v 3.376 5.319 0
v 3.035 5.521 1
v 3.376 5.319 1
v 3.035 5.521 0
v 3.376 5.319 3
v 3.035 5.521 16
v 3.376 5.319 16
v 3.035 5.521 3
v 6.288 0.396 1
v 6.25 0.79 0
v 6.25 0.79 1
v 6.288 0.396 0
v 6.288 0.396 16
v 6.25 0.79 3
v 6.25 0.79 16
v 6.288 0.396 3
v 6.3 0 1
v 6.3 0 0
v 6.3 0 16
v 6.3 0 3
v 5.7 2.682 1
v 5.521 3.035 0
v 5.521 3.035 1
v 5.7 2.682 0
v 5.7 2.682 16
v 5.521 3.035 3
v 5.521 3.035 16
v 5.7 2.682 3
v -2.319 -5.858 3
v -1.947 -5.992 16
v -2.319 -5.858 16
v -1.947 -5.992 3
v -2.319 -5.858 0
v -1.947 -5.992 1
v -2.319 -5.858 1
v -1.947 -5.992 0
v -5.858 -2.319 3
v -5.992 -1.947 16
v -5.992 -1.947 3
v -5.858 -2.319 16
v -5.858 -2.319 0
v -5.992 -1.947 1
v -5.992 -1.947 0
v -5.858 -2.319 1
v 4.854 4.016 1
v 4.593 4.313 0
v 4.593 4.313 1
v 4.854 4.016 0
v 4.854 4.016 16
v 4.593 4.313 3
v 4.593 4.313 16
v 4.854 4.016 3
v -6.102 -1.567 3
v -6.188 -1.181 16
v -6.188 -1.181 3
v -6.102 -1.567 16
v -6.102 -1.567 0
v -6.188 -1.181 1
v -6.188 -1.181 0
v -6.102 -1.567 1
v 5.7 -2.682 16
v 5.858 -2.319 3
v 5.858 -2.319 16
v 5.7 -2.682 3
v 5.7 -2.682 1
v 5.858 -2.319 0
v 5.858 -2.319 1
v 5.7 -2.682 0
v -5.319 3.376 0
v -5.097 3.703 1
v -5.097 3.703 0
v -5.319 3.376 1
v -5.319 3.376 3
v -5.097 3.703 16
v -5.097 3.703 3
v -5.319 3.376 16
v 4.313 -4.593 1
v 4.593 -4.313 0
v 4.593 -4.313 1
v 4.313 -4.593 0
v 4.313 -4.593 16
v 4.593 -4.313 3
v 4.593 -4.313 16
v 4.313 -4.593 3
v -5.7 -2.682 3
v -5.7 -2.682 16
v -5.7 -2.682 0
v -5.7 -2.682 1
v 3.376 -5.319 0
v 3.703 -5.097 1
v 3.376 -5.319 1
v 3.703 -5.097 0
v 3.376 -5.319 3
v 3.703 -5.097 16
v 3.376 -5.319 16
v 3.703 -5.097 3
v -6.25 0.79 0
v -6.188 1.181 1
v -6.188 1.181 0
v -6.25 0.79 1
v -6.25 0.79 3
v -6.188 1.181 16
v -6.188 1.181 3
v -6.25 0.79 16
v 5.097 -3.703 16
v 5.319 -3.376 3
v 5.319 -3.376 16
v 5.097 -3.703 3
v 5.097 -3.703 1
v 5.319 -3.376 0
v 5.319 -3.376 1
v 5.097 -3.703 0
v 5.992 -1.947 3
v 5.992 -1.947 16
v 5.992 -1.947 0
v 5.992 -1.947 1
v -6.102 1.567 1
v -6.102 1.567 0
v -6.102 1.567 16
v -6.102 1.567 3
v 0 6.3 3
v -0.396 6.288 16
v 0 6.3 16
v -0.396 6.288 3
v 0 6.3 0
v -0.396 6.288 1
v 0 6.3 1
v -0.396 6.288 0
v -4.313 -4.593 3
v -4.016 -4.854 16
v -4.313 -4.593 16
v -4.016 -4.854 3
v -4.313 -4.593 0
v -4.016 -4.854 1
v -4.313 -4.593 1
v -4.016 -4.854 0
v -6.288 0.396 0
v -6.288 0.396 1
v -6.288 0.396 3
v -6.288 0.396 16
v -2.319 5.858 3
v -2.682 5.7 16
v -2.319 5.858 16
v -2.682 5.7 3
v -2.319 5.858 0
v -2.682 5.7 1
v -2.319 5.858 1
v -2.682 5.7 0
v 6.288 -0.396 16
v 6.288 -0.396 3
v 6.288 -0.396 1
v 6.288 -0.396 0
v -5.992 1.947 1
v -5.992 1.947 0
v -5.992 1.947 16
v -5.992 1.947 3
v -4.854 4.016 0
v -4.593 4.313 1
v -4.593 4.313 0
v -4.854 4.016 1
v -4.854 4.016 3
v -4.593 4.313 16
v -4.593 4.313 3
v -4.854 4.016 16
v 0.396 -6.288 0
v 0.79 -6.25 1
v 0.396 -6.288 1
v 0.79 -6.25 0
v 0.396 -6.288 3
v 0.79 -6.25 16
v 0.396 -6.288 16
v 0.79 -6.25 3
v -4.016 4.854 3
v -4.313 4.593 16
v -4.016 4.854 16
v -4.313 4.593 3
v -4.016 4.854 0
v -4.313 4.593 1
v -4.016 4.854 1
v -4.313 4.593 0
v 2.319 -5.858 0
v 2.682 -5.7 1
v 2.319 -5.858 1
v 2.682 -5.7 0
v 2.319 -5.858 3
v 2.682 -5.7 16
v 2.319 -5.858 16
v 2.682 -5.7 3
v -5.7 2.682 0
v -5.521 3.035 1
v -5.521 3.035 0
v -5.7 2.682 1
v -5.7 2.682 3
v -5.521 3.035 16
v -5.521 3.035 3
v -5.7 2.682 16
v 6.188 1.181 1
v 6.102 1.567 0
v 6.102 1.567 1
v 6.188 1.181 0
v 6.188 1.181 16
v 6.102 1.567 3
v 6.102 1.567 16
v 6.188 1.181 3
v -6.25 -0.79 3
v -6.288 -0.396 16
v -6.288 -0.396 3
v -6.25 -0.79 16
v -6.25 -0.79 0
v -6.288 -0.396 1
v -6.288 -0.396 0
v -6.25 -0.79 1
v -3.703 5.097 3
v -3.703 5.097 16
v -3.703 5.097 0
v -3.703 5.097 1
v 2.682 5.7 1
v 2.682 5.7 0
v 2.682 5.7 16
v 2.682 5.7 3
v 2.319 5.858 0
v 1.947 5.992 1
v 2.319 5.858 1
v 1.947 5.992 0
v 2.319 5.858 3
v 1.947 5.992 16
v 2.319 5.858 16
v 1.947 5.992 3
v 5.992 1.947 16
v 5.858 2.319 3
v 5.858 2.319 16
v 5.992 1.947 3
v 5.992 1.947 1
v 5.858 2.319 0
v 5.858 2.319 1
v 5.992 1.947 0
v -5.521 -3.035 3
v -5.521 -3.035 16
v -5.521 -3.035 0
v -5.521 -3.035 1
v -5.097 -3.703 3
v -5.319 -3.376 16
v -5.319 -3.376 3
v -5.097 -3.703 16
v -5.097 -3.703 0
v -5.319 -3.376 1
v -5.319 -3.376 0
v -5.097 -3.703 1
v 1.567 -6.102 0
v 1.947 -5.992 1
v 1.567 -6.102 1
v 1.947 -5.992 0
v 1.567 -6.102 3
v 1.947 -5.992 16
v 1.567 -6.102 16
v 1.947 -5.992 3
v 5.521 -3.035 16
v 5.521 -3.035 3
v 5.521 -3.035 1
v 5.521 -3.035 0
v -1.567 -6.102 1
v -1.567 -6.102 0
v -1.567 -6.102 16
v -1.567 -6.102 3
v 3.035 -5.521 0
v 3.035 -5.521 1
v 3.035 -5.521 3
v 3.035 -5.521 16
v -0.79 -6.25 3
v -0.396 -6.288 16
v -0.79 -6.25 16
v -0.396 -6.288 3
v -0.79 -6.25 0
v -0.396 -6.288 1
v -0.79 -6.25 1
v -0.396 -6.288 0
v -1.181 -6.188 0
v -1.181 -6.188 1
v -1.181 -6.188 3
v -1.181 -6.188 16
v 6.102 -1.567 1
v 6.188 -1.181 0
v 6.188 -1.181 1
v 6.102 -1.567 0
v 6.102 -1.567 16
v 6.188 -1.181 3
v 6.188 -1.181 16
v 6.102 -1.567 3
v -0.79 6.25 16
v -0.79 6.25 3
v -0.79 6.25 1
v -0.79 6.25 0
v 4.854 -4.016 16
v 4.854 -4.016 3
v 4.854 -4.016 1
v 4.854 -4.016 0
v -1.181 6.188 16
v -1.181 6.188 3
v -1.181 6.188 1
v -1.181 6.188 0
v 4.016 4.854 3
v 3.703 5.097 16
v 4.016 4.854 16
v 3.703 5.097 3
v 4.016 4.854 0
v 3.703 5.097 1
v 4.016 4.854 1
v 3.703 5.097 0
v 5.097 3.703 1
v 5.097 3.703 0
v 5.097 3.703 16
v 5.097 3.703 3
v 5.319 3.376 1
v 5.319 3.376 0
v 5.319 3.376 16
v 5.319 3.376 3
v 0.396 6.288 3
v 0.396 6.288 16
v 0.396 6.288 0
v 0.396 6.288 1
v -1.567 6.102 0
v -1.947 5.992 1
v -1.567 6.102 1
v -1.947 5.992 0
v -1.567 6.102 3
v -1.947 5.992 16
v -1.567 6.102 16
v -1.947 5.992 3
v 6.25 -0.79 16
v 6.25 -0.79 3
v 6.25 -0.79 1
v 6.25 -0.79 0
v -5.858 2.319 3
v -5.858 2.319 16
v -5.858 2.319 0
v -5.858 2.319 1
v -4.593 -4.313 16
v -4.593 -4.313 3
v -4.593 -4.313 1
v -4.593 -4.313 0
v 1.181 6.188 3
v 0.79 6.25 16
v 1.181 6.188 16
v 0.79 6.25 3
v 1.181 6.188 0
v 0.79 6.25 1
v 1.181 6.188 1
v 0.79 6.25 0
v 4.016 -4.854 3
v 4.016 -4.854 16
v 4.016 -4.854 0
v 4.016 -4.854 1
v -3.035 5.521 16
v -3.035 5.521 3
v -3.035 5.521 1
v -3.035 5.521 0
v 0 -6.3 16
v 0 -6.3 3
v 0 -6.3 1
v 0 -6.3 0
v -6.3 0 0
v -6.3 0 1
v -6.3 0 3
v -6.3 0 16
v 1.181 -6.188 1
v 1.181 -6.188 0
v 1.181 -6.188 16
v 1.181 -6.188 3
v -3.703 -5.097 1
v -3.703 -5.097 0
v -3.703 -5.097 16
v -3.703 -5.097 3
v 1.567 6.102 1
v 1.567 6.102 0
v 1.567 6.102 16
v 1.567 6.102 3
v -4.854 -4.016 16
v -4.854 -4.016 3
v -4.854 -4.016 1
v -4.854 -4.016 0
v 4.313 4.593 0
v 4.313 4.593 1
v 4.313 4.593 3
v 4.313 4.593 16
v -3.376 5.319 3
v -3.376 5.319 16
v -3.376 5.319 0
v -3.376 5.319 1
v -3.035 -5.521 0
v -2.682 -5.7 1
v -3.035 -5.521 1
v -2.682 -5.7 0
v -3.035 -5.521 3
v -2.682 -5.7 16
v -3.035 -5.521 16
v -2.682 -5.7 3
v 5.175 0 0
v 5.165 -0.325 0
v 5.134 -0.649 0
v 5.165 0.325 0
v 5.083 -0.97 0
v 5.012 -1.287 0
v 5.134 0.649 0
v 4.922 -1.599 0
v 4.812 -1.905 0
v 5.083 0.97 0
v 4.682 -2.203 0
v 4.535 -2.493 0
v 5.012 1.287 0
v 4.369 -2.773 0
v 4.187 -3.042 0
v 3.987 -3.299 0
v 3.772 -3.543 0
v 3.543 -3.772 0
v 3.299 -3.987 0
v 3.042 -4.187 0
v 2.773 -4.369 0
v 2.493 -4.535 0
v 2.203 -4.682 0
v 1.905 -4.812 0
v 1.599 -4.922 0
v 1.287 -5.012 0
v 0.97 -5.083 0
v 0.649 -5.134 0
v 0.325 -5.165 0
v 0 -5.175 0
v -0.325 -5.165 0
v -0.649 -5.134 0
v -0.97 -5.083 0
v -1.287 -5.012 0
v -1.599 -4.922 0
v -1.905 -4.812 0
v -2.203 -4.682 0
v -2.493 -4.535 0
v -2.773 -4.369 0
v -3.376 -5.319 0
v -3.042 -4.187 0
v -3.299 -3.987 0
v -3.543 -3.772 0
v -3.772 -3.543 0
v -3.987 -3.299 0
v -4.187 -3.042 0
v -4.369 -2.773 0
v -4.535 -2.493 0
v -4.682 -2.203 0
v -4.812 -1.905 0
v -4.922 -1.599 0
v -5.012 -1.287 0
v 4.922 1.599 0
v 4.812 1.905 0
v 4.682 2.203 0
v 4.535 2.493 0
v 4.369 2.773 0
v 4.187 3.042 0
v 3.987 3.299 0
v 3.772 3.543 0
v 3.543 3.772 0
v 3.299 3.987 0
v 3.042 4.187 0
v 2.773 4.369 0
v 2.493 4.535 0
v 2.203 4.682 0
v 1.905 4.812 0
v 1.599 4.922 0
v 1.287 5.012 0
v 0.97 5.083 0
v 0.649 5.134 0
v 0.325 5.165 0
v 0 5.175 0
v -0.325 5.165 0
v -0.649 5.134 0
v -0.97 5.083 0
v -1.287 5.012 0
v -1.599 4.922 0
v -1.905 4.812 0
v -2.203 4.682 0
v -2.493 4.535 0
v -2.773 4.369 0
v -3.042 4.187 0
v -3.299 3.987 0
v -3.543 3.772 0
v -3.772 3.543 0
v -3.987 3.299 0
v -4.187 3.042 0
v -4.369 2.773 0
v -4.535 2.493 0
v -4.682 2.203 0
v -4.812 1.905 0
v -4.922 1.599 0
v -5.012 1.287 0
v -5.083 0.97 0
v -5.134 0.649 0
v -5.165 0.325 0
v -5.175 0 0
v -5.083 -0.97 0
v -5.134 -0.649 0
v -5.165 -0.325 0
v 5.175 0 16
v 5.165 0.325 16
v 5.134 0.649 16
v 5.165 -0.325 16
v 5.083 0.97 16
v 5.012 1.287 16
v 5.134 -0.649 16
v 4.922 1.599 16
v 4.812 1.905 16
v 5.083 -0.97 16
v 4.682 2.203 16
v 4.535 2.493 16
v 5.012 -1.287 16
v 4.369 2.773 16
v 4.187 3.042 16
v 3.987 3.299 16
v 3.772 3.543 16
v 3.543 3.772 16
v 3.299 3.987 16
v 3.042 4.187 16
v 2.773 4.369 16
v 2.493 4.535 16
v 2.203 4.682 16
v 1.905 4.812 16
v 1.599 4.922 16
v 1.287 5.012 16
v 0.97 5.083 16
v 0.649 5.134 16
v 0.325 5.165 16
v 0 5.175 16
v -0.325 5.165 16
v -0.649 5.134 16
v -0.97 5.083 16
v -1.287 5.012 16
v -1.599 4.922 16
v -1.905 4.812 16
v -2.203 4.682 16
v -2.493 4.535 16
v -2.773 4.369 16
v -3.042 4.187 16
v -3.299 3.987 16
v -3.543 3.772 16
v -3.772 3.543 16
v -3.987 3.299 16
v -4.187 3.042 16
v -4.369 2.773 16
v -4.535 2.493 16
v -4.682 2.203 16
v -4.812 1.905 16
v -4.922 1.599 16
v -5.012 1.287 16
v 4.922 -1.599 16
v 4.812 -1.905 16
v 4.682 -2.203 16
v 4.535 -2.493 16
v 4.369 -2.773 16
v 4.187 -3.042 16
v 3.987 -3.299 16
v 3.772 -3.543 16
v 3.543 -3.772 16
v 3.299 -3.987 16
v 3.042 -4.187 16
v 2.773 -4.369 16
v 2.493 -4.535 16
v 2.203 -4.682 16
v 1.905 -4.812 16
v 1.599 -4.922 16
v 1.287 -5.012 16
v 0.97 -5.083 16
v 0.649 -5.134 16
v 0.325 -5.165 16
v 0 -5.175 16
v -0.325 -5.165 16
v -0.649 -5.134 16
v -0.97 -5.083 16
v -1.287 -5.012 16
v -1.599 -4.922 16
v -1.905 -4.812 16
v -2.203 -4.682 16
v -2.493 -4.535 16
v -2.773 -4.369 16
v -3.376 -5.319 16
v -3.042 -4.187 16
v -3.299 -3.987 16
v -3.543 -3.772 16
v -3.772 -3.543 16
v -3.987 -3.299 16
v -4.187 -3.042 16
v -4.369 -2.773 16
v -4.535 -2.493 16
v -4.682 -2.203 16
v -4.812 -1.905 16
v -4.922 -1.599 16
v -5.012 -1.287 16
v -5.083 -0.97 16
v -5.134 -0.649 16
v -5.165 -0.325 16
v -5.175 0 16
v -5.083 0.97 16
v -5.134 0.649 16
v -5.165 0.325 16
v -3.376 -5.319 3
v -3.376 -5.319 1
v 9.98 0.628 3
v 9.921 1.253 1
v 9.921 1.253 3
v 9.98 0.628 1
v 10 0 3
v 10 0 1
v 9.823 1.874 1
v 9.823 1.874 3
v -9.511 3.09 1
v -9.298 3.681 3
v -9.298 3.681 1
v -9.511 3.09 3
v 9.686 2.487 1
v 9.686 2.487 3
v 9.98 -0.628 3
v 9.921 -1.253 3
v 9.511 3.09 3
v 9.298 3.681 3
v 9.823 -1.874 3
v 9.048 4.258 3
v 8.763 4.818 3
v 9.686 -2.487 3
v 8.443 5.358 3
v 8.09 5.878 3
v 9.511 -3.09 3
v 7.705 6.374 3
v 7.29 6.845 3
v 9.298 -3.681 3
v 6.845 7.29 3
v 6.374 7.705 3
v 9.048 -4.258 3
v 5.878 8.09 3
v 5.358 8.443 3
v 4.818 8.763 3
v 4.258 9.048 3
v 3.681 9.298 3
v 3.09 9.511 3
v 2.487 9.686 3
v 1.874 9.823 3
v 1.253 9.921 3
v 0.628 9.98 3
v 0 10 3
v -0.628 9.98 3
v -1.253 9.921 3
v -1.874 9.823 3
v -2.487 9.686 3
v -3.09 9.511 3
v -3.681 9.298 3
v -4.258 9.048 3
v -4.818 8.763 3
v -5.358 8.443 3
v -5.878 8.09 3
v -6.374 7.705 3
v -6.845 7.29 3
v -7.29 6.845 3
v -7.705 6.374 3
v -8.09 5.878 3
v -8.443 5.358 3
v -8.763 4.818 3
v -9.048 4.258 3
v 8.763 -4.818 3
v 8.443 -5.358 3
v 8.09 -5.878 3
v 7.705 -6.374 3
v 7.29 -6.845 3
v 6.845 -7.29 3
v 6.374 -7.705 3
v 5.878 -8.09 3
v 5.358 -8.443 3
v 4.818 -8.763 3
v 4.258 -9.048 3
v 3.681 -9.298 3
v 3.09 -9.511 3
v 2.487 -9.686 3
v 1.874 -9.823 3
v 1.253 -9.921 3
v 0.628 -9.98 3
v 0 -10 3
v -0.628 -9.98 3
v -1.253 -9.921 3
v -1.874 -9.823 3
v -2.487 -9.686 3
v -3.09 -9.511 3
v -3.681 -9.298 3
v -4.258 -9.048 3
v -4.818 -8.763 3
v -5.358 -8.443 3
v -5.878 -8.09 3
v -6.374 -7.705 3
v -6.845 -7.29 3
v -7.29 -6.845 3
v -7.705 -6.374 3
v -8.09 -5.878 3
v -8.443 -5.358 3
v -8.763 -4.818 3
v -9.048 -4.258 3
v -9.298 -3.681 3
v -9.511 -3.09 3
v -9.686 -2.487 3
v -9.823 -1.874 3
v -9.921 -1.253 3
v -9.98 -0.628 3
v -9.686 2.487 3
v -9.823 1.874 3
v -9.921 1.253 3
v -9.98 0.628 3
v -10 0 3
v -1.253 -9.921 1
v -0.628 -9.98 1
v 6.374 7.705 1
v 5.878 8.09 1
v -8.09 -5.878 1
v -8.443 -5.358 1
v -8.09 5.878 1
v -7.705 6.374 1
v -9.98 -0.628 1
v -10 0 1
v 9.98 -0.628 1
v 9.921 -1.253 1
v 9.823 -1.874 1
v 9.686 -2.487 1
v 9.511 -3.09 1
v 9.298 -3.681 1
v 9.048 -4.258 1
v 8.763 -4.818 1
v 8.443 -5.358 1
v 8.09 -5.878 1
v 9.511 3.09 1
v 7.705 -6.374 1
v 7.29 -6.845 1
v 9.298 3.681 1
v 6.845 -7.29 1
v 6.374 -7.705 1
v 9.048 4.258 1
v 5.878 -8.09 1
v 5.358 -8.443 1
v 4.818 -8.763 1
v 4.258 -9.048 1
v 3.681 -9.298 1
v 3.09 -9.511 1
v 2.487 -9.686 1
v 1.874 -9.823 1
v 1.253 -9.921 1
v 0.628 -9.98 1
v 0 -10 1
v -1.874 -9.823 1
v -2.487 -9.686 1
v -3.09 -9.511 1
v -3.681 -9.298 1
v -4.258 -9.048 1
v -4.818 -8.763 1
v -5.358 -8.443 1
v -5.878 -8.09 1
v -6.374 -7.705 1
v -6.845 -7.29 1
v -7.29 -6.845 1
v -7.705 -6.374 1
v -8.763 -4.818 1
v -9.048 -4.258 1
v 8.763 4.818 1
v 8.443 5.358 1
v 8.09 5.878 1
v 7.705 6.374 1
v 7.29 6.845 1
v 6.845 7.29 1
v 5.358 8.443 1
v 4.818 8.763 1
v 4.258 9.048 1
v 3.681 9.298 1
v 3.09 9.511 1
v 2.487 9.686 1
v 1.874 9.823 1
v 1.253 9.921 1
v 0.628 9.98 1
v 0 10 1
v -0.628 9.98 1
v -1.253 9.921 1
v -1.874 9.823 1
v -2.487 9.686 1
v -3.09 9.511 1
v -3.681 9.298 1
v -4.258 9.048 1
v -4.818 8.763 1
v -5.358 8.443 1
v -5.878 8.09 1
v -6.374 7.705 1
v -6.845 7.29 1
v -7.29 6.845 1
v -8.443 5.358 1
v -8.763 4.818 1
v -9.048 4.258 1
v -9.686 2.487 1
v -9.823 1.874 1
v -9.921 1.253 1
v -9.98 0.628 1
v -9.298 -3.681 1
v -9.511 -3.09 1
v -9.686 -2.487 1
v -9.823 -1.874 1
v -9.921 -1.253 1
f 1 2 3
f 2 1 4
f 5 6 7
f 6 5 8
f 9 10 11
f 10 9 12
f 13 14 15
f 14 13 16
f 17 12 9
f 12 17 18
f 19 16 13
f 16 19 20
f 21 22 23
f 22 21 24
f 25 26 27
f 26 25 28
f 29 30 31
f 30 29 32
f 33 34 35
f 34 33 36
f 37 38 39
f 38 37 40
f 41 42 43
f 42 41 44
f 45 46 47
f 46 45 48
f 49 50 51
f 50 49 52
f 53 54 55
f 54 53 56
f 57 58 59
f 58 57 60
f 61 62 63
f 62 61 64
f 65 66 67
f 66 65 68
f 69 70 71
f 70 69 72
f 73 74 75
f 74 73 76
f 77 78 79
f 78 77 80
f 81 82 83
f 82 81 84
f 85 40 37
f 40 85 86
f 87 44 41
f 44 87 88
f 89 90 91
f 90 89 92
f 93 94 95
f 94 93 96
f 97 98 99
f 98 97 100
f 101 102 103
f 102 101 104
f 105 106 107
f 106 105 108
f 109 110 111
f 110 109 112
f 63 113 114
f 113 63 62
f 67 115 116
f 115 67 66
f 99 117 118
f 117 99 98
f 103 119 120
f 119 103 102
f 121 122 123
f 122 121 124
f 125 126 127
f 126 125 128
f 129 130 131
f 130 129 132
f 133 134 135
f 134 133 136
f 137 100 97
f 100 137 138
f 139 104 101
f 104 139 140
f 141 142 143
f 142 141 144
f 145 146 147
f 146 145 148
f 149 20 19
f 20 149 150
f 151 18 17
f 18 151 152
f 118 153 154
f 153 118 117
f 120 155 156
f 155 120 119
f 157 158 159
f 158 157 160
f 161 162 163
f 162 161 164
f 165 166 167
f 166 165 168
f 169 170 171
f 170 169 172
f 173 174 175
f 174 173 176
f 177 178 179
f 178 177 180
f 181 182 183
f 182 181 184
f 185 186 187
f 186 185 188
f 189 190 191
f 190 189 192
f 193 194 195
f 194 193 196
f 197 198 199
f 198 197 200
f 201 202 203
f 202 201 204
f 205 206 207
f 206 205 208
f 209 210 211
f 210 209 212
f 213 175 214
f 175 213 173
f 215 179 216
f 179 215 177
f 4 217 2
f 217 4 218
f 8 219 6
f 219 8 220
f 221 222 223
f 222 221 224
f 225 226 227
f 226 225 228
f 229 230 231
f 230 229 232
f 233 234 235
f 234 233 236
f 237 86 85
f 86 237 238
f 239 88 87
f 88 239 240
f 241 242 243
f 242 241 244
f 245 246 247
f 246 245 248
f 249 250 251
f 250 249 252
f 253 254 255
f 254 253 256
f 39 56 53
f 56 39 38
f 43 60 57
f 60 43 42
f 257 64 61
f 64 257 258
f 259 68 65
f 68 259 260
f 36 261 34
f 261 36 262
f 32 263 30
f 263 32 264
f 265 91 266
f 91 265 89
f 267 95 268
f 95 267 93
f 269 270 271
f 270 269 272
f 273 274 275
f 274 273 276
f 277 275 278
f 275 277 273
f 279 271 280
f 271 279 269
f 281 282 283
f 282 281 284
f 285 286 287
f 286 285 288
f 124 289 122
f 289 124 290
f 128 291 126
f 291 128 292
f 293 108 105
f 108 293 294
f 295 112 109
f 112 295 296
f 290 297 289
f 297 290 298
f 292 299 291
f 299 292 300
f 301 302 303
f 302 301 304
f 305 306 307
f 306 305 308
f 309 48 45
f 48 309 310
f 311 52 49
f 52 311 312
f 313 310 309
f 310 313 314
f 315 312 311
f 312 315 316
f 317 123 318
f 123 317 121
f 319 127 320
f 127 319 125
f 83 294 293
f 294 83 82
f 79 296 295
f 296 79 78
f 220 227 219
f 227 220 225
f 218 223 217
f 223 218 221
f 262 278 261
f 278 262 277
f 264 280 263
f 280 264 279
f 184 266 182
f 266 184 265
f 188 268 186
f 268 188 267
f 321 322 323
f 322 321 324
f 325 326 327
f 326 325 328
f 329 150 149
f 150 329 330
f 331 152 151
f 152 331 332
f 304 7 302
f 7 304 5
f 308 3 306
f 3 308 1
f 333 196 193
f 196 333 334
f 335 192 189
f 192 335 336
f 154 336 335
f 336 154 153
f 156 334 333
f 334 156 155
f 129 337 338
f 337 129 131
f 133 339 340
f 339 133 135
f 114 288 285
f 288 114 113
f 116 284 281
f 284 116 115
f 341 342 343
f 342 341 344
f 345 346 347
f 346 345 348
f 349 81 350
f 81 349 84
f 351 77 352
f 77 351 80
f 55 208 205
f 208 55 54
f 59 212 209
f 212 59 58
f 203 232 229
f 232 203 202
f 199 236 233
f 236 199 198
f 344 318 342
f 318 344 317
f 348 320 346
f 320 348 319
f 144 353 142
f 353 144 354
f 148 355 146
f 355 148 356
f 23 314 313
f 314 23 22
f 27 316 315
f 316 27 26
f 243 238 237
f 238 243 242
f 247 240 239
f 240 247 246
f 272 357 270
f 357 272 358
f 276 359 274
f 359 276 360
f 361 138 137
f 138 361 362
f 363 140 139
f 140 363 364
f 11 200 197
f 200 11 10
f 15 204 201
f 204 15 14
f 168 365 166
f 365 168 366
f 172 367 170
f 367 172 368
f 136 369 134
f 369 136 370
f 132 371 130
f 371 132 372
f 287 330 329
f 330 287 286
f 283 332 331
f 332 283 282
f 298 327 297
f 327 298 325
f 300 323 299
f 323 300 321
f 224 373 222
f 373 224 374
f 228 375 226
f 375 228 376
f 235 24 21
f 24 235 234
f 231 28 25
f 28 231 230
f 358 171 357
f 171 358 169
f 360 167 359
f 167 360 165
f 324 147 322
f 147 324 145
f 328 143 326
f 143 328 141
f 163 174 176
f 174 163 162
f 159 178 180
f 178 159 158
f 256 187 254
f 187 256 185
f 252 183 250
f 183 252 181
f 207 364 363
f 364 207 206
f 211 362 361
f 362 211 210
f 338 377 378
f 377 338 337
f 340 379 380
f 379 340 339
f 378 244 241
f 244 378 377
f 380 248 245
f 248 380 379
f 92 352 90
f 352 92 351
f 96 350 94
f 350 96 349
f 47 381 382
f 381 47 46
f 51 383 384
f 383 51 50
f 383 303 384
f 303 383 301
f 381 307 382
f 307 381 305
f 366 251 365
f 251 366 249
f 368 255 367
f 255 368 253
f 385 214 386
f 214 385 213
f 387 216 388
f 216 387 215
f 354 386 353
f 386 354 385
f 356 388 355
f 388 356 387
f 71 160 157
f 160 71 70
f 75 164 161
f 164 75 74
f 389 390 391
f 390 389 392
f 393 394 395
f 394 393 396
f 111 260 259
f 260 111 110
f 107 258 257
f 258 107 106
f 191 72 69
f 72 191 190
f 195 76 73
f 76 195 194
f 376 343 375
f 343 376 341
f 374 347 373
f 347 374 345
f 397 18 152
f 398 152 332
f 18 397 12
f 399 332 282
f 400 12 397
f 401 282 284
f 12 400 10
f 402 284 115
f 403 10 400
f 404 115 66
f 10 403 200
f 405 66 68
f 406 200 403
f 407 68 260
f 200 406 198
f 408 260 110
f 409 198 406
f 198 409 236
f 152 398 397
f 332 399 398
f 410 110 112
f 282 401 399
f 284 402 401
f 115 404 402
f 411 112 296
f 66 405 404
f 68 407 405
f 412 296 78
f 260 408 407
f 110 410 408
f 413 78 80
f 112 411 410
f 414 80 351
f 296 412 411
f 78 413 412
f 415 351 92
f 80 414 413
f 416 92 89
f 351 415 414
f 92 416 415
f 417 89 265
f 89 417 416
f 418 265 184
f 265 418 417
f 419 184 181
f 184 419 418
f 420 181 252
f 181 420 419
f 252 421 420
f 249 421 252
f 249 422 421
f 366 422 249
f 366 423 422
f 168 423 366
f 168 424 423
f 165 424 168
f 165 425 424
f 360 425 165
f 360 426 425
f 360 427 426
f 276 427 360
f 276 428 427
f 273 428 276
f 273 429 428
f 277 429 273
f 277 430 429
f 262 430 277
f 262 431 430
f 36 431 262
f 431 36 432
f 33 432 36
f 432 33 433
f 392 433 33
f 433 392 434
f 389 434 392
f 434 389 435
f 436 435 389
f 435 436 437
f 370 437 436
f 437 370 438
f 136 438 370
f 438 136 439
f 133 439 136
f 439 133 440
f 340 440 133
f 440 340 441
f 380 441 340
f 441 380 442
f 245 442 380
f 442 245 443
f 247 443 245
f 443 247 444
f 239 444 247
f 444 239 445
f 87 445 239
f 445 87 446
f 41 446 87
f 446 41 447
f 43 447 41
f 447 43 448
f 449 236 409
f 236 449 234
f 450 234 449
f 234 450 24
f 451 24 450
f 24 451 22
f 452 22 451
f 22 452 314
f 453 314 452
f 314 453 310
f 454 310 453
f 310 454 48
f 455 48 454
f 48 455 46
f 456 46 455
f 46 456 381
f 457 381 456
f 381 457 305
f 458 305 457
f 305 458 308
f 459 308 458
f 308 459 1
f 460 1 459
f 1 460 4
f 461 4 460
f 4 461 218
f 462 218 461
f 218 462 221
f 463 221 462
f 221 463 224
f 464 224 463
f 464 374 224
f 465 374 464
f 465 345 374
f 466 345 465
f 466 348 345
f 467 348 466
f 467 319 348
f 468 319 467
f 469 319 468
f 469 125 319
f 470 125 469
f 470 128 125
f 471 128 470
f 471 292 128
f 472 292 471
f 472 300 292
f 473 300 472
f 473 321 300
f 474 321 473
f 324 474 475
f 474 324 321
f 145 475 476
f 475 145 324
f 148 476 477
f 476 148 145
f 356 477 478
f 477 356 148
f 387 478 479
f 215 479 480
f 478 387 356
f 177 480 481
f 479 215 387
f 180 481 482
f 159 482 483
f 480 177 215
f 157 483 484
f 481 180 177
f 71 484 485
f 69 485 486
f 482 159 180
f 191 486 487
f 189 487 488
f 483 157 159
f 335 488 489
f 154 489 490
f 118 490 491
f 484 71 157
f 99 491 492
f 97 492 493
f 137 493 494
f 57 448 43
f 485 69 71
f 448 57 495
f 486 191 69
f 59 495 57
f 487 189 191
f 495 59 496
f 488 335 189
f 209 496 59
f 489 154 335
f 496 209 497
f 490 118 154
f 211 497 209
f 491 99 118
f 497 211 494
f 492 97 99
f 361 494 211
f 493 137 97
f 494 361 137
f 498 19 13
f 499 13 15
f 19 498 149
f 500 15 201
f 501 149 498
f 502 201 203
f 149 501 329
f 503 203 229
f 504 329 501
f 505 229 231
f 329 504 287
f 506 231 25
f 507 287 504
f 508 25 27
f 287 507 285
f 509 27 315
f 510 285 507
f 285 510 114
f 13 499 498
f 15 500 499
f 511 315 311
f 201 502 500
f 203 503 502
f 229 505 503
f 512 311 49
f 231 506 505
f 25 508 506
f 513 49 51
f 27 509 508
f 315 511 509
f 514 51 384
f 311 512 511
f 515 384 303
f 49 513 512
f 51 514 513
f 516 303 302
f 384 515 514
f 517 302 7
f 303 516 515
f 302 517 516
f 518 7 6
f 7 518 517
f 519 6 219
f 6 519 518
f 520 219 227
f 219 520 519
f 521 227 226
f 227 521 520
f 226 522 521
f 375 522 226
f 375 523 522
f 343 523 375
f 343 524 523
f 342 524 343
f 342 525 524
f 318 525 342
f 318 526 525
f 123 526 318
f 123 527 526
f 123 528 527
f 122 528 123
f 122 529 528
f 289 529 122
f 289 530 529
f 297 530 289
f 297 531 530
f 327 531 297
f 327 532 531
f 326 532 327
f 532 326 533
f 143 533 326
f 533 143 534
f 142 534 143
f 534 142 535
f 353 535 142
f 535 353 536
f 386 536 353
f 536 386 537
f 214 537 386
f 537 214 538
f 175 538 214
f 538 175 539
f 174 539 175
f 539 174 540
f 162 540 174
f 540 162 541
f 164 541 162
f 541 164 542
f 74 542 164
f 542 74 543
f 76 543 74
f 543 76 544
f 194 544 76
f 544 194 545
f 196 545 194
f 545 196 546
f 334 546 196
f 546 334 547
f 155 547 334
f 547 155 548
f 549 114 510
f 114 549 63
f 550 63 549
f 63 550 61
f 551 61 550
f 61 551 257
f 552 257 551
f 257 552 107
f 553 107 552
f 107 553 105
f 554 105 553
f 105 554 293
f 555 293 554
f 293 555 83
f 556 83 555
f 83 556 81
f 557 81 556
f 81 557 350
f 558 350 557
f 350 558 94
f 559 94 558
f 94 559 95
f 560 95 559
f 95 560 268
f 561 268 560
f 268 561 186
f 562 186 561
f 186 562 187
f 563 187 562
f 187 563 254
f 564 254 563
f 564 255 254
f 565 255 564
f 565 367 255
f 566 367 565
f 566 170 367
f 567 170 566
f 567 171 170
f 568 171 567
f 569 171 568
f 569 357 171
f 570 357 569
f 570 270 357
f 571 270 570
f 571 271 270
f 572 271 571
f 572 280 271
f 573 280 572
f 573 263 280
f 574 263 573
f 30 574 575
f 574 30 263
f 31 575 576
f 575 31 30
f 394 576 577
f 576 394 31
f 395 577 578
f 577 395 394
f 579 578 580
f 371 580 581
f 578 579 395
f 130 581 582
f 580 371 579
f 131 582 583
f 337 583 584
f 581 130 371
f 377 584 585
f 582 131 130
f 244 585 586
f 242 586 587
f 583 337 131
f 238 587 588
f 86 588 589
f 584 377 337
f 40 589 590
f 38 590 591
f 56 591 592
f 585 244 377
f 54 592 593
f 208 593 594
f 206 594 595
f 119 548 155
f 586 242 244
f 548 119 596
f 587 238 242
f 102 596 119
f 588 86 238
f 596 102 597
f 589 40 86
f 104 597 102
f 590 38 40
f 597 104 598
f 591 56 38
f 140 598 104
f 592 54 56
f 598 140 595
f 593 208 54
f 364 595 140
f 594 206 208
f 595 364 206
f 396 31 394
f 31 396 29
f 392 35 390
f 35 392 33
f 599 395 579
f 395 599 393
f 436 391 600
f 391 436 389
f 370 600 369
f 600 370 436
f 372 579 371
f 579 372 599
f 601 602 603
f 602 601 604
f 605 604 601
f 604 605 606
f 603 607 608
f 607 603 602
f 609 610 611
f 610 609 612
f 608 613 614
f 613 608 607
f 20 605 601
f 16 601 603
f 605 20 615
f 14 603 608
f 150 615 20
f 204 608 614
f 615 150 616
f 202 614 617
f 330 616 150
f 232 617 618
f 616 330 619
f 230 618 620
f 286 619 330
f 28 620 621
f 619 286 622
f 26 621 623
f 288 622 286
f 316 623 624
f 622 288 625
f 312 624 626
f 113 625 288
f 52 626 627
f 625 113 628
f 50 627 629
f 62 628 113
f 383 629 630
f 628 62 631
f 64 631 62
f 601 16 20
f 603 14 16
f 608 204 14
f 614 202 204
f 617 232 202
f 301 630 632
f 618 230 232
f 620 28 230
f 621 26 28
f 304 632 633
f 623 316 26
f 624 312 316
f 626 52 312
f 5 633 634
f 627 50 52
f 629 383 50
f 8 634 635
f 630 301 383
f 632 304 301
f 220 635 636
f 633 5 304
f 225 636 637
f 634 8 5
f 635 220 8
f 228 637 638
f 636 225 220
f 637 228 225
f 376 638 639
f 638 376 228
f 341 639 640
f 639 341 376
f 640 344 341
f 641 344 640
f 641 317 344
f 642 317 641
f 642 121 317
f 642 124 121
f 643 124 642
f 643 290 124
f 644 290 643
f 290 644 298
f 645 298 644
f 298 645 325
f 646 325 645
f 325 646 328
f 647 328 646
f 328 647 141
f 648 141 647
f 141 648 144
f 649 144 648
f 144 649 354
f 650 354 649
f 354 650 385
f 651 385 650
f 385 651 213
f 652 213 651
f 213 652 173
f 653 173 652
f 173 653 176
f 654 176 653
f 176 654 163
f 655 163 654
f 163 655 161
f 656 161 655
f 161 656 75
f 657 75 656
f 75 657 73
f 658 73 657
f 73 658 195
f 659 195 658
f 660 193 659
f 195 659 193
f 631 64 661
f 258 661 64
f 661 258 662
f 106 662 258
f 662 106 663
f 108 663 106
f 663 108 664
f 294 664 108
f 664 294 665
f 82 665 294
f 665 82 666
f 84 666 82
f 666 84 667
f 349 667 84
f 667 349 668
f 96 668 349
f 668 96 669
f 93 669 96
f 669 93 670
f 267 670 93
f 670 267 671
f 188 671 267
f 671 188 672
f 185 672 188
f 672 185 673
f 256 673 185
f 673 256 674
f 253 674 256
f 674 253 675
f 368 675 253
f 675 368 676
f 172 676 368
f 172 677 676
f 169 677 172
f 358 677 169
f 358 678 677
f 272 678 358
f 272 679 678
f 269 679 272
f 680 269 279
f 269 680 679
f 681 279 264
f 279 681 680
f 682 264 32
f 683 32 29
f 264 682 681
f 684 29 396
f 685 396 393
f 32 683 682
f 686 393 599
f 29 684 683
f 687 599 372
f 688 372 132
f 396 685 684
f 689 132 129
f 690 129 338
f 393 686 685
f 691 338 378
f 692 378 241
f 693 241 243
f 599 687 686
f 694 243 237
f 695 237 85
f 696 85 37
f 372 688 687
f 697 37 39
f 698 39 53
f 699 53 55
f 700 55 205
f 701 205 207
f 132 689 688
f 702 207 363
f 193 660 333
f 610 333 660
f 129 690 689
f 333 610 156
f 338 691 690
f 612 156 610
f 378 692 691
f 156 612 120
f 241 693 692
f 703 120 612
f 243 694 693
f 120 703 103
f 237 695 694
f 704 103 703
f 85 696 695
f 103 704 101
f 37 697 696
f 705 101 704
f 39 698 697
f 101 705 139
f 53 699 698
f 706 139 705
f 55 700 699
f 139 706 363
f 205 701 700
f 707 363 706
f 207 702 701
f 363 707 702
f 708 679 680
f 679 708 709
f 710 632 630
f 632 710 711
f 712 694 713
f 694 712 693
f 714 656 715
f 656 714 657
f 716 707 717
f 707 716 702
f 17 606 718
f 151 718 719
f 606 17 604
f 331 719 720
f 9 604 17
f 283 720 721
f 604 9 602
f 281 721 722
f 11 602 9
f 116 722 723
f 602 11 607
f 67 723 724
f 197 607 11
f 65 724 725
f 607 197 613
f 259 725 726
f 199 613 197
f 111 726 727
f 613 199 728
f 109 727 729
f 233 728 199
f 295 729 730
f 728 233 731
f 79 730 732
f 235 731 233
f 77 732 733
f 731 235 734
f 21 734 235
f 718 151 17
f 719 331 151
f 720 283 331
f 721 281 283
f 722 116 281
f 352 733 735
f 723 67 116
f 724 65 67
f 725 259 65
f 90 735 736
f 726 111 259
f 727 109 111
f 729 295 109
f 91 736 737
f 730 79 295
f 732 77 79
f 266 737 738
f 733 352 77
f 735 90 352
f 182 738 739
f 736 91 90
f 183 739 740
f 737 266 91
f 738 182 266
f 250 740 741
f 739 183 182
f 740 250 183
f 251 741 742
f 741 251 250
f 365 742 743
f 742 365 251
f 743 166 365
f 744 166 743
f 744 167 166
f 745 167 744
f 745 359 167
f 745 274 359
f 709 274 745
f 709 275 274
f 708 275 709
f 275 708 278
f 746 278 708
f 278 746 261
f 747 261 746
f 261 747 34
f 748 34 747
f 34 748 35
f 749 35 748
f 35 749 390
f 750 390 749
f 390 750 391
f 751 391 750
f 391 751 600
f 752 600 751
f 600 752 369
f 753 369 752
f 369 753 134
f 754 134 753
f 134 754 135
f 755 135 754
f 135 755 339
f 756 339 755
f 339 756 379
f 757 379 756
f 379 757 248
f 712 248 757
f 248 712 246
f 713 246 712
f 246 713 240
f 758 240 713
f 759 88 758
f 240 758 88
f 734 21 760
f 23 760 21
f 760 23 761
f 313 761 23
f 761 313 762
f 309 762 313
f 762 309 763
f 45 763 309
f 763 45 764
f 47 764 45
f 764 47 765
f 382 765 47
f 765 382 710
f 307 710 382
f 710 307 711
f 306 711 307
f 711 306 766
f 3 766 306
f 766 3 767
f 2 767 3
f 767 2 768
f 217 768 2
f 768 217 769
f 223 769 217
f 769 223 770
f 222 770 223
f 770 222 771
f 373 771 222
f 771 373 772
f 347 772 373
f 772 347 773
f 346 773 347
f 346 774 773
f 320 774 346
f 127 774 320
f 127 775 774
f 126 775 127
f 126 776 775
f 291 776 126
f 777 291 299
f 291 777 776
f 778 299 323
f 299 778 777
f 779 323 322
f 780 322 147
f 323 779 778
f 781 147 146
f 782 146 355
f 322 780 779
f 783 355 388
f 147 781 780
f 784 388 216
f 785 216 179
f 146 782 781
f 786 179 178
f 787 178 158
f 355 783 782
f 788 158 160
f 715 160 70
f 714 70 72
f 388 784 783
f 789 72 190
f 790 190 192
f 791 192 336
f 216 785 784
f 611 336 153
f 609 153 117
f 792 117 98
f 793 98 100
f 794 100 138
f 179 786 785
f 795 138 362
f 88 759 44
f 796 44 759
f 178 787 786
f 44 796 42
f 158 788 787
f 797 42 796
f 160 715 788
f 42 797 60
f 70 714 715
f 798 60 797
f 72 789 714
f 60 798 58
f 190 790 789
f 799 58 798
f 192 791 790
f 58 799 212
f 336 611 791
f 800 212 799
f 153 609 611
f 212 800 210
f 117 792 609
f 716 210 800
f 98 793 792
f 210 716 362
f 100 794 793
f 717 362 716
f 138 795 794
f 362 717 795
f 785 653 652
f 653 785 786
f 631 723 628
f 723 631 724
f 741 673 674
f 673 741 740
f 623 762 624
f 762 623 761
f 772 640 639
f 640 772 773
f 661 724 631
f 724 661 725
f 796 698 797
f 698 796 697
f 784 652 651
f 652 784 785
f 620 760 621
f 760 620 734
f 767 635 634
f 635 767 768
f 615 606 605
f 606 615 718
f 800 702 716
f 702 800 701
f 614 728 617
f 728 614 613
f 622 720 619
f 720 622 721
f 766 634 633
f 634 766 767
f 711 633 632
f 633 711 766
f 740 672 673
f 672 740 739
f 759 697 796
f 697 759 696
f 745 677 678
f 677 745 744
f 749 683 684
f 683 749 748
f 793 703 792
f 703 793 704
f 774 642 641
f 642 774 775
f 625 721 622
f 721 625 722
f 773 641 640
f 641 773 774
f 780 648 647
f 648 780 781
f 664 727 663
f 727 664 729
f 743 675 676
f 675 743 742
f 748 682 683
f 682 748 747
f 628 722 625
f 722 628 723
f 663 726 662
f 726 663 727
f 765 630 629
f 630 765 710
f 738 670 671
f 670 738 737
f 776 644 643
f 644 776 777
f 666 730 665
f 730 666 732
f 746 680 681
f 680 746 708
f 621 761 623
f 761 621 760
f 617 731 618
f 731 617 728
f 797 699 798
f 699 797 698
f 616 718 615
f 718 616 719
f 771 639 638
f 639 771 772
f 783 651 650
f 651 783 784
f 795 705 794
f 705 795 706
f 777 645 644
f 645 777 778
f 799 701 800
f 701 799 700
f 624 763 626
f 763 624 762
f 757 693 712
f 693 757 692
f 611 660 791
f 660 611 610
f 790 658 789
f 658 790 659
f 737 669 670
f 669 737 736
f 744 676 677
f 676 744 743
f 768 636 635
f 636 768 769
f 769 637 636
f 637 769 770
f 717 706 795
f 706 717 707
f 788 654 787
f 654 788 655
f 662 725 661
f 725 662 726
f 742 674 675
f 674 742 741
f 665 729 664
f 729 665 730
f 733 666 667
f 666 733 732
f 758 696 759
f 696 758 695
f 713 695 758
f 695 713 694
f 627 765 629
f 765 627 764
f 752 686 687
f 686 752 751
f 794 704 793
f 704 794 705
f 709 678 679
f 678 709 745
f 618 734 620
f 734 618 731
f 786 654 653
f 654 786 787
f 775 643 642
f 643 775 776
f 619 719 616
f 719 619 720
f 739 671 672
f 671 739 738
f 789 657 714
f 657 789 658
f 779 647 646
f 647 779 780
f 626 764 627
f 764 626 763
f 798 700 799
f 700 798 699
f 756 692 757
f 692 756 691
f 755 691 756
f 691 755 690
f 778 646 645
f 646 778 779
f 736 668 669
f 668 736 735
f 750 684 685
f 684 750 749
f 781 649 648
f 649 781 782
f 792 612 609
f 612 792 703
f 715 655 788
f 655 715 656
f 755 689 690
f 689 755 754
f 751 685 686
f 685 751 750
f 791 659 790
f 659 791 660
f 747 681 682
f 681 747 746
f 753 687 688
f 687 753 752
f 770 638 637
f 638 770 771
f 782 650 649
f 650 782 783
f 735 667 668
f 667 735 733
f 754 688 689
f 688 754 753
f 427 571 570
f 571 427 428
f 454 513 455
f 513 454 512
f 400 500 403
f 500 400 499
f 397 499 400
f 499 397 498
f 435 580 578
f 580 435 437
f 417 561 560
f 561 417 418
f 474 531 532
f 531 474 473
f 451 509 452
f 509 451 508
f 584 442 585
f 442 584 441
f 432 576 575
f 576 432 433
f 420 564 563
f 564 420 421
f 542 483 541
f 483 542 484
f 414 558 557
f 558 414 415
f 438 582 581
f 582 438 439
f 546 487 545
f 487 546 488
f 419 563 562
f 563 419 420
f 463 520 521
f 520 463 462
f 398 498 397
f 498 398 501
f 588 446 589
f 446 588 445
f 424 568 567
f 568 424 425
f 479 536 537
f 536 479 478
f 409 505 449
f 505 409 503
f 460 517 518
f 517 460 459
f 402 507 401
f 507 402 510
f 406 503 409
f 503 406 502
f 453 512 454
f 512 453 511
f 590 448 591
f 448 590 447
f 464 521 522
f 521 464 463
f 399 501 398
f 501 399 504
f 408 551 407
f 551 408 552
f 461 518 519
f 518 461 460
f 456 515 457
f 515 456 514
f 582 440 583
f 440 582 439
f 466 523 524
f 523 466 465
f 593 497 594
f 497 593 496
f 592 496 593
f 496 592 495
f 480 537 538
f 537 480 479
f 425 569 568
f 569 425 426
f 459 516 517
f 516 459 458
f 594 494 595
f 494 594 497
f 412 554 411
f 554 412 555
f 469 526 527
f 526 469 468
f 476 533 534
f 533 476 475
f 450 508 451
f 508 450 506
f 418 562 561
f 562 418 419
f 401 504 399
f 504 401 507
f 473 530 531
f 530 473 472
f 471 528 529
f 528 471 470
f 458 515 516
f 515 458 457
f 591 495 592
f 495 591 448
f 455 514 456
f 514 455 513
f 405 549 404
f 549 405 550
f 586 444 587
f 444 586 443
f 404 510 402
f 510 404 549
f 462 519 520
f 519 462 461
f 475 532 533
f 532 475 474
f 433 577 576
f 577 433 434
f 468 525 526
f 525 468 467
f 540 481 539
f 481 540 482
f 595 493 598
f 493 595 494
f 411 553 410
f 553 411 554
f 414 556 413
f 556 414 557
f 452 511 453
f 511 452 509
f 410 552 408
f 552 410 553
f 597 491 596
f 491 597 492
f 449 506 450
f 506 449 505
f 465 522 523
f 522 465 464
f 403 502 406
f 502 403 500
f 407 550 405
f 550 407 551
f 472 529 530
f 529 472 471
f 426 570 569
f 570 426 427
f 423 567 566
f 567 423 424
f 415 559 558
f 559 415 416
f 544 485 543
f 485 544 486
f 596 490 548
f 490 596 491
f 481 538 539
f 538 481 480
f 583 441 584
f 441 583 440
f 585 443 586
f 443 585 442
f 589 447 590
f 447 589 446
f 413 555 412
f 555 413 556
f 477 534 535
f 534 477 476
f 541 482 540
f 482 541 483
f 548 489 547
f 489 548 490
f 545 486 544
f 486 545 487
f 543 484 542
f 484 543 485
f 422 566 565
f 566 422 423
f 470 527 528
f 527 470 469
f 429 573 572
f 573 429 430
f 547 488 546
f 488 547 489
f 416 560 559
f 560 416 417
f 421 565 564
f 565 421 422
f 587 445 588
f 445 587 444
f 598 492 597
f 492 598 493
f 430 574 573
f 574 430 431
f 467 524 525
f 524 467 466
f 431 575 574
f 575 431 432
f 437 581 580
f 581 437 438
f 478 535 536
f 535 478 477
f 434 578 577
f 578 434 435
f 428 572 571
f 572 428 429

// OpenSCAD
$fn = 100;

// Dimensions
outer_diameter = 12.6;
inner_diameter = 10.35;
length = 16;
pad_diameter = 20;
pad_thickness = 2;

// Main body
difference() {
    union() {
        // Cylinder for the body
        cylinder(h = length, d = outer_diameter, center = false);
        
        // Pad at the bottom
        translate([0, 0, 1])
            cylinder(h = pad_thickness, d = pad_diameter, center = false);
    }
    
    // Hollow inner part
    translate([0, 0, 0])
        cylinder(h = length + pad_thickness, d = inner_diameter, center = false);
}
